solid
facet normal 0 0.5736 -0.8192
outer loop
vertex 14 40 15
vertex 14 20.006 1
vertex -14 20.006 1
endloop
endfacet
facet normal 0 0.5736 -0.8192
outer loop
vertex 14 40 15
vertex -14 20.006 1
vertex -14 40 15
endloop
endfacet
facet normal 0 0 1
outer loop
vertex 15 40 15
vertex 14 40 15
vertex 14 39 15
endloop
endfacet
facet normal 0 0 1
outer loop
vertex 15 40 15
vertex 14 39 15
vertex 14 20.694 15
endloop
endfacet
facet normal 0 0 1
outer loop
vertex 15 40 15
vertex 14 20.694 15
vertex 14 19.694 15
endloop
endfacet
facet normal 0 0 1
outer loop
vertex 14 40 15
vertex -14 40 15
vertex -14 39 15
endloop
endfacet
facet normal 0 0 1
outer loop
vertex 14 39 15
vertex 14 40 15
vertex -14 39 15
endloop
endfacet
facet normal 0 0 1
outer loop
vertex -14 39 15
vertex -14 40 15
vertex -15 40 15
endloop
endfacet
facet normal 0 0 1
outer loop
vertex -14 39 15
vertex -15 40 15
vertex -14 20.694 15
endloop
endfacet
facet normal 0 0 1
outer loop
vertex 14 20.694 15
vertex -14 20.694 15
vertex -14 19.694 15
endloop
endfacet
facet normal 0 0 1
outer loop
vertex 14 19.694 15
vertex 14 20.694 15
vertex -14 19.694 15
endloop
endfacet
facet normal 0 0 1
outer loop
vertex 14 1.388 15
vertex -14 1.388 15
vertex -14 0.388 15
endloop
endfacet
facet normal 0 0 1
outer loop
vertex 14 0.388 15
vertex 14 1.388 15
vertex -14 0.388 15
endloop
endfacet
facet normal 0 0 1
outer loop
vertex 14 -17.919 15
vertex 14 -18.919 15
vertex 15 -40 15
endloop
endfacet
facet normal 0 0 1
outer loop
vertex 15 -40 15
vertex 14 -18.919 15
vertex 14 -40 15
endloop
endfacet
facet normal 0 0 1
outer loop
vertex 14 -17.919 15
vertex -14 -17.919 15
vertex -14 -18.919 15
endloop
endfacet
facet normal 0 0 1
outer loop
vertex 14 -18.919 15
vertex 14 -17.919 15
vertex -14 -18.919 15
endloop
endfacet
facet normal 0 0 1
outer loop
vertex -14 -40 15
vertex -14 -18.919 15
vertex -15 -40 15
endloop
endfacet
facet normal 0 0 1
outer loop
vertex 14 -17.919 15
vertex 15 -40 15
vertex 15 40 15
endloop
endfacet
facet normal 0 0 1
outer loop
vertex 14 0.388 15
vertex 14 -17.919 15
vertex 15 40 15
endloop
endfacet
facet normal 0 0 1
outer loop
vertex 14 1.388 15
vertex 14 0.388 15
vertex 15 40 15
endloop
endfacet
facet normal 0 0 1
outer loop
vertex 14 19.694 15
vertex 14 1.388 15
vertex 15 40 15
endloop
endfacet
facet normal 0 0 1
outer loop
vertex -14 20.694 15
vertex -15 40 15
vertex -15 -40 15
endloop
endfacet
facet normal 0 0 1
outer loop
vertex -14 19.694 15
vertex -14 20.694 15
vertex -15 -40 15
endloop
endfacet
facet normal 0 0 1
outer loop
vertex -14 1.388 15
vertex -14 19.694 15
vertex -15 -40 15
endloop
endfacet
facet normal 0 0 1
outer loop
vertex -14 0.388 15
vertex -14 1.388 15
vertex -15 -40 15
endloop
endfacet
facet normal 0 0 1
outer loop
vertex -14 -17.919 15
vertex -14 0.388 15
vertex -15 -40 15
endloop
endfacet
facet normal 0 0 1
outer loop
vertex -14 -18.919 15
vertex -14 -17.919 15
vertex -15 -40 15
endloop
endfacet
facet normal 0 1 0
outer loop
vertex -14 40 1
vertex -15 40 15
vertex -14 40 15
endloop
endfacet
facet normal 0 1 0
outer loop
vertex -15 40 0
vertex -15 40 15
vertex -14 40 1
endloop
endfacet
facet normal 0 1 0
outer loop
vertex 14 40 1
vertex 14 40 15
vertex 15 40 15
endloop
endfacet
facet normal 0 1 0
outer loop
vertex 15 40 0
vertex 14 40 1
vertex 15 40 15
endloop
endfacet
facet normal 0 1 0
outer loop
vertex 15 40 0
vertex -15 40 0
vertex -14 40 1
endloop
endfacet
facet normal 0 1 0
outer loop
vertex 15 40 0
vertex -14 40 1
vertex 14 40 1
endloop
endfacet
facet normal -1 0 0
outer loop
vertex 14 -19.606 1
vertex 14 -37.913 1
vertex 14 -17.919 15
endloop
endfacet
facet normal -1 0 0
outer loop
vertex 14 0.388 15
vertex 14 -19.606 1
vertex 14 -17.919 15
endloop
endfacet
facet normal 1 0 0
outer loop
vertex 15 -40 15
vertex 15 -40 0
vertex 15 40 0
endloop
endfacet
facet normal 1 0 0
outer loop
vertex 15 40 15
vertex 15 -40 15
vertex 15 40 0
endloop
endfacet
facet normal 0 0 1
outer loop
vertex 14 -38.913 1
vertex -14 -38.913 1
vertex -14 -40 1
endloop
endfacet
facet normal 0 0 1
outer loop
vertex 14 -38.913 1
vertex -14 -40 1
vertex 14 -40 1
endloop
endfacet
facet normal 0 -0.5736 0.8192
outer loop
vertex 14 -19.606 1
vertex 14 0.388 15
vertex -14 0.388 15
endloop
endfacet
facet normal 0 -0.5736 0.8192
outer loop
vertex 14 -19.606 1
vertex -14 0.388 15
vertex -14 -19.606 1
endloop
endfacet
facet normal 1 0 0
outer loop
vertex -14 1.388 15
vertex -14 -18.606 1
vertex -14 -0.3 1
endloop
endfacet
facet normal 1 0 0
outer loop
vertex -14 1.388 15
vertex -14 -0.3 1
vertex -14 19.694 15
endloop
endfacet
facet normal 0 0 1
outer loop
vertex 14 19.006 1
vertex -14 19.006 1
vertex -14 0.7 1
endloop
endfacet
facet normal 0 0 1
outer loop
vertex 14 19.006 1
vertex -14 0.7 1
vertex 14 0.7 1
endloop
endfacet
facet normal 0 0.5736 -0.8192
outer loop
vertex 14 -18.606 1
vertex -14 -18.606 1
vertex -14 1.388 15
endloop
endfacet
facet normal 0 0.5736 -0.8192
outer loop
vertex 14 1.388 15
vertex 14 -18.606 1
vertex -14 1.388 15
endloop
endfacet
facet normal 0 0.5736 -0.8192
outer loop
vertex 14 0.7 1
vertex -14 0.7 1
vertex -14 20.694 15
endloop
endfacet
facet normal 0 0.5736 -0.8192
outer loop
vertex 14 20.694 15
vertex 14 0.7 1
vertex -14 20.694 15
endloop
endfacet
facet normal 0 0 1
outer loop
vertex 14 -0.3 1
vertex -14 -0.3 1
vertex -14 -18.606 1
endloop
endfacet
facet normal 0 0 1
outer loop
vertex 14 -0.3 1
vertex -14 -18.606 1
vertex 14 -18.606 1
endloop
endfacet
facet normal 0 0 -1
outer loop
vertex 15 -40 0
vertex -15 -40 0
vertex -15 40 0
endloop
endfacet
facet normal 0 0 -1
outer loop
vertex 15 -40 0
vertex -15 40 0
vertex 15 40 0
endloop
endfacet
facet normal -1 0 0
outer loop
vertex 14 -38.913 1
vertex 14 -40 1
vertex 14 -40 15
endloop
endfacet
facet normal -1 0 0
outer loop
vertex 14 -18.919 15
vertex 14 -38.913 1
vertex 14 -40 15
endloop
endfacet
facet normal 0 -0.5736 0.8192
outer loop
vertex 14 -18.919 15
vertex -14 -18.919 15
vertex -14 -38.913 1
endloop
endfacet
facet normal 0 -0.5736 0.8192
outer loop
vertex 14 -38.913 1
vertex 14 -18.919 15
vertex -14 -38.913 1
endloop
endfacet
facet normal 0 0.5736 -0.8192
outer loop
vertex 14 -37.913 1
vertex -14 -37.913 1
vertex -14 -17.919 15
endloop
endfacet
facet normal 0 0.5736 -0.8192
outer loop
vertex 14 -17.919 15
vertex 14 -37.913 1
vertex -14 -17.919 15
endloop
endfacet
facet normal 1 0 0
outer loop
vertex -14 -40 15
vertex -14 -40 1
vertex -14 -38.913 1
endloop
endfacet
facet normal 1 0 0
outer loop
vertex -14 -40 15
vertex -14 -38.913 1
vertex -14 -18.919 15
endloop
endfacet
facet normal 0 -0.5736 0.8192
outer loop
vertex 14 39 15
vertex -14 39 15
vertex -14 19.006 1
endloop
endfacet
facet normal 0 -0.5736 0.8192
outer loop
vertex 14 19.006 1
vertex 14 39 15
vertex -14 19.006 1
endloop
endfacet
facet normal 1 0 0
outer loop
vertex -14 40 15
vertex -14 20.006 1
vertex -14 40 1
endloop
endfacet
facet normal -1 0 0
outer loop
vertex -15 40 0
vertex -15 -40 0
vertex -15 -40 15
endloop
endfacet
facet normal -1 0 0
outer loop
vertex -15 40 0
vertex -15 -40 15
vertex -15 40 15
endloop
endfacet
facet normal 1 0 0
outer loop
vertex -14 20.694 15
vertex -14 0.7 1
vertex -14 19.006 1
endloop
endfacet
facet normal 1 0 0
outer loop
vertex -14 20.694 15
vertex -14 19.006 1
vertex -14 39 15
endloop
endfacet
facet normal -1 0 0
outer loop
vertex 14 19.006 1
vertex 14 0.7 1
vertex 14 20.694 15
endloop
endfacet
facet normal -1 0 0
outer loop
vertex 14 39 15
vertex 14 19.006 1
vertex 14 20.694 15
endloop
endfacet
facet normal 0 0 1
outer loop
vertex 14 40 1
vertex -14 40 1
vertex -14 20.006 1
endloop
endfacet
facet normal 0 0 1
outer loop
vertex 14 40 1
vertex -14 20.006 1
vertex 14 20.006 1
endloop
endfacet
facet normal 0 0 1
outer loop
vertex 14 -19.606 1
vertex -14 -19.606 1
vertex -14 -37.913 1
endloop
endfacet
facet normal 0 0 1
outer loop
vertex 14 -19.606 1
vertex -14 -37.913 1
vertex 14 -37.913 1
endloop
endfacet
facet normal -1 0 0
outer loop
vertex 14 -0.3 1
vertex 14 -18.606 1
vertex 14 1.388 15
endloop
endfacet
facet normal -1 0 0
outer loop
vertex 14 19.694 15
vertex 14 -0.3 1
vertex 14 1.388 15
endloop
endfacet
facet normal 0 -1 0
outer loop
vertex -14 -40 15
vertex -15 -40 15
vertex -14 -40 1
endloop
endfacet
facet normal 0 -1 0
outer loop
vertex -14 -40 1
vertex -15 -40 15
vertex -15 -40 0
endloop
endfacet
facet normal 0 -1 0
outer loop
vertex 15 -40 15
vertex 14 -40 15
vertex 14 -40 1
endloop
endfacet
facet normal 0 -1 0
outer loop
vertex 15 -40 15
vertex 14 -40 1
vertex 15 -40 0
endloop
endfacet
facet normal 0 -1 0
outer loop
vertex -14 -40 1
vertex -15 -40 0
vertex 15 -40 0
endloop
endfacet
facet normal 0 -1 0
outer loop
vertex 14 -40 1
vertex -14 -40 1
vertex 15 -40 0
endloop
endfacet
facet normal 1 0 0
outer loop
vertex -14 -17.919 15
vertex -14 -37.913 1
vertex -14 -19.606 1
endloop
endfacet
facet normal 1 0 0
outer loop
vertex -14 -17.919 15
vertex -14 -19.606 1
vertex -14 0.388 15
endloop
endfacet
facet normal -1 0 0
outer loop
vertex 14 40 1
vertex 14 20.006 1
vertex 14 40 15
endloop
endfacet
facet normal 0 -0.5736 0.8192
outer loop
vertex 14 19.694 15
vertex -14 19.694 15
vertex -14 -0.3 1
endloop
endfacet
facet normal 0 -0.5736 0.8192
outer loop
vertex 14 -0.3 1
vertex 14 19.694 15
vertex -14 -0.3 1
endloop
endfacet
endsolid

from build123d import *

# Parameters (mm, degrees)
F0_W     = 28
F0_H     = 80
F1_DEPTH = 1
F0_W_2   = 1
F2_DEPTH = 15
F4_DEPTH = 28


with BuildPart() as f1:
    # F0 (on Top) → F1 (new body)
    with BuildSketch(Plane.XY):
        Rectangle(F0_W, F0_H)
    extrude(amount=F1_DEPTH)

    # F0 (on Top) → F2 (join)
    with BuildSketch(Plane.XY):
        with Locations((-14.5, 0)):
            Rectangle(F0_W_2, F0_H)
        with Locations((14.5, 0)):
            Rectangle(F0_W_2, F0_H)
    extrude(amount=F2_DEPTH)

    # F3 (on face) → F4 (join, through all)
    with BuildSketch(Plane.YZ.offset(-14)):
        Polygon((19.005928, 1), (20.005928, 1), (40, 15), (39, 15), align=None)
        Polygon((-0.300263, 1), (0.699737, 1), (20.693809, 15), (19.693809, 15), align=None)
        Polygon((-19.606455, 1), (-18.606455, 1), (1.387617, 15), (0.387617, 15), align=None)
        Polygon((-38.912646, 1), (-37.912646, 1), (-17.918574, 15), (-18.918574, 15), align=None)
    extrude(amount=F4_DEPTH)


solid = f1.part
